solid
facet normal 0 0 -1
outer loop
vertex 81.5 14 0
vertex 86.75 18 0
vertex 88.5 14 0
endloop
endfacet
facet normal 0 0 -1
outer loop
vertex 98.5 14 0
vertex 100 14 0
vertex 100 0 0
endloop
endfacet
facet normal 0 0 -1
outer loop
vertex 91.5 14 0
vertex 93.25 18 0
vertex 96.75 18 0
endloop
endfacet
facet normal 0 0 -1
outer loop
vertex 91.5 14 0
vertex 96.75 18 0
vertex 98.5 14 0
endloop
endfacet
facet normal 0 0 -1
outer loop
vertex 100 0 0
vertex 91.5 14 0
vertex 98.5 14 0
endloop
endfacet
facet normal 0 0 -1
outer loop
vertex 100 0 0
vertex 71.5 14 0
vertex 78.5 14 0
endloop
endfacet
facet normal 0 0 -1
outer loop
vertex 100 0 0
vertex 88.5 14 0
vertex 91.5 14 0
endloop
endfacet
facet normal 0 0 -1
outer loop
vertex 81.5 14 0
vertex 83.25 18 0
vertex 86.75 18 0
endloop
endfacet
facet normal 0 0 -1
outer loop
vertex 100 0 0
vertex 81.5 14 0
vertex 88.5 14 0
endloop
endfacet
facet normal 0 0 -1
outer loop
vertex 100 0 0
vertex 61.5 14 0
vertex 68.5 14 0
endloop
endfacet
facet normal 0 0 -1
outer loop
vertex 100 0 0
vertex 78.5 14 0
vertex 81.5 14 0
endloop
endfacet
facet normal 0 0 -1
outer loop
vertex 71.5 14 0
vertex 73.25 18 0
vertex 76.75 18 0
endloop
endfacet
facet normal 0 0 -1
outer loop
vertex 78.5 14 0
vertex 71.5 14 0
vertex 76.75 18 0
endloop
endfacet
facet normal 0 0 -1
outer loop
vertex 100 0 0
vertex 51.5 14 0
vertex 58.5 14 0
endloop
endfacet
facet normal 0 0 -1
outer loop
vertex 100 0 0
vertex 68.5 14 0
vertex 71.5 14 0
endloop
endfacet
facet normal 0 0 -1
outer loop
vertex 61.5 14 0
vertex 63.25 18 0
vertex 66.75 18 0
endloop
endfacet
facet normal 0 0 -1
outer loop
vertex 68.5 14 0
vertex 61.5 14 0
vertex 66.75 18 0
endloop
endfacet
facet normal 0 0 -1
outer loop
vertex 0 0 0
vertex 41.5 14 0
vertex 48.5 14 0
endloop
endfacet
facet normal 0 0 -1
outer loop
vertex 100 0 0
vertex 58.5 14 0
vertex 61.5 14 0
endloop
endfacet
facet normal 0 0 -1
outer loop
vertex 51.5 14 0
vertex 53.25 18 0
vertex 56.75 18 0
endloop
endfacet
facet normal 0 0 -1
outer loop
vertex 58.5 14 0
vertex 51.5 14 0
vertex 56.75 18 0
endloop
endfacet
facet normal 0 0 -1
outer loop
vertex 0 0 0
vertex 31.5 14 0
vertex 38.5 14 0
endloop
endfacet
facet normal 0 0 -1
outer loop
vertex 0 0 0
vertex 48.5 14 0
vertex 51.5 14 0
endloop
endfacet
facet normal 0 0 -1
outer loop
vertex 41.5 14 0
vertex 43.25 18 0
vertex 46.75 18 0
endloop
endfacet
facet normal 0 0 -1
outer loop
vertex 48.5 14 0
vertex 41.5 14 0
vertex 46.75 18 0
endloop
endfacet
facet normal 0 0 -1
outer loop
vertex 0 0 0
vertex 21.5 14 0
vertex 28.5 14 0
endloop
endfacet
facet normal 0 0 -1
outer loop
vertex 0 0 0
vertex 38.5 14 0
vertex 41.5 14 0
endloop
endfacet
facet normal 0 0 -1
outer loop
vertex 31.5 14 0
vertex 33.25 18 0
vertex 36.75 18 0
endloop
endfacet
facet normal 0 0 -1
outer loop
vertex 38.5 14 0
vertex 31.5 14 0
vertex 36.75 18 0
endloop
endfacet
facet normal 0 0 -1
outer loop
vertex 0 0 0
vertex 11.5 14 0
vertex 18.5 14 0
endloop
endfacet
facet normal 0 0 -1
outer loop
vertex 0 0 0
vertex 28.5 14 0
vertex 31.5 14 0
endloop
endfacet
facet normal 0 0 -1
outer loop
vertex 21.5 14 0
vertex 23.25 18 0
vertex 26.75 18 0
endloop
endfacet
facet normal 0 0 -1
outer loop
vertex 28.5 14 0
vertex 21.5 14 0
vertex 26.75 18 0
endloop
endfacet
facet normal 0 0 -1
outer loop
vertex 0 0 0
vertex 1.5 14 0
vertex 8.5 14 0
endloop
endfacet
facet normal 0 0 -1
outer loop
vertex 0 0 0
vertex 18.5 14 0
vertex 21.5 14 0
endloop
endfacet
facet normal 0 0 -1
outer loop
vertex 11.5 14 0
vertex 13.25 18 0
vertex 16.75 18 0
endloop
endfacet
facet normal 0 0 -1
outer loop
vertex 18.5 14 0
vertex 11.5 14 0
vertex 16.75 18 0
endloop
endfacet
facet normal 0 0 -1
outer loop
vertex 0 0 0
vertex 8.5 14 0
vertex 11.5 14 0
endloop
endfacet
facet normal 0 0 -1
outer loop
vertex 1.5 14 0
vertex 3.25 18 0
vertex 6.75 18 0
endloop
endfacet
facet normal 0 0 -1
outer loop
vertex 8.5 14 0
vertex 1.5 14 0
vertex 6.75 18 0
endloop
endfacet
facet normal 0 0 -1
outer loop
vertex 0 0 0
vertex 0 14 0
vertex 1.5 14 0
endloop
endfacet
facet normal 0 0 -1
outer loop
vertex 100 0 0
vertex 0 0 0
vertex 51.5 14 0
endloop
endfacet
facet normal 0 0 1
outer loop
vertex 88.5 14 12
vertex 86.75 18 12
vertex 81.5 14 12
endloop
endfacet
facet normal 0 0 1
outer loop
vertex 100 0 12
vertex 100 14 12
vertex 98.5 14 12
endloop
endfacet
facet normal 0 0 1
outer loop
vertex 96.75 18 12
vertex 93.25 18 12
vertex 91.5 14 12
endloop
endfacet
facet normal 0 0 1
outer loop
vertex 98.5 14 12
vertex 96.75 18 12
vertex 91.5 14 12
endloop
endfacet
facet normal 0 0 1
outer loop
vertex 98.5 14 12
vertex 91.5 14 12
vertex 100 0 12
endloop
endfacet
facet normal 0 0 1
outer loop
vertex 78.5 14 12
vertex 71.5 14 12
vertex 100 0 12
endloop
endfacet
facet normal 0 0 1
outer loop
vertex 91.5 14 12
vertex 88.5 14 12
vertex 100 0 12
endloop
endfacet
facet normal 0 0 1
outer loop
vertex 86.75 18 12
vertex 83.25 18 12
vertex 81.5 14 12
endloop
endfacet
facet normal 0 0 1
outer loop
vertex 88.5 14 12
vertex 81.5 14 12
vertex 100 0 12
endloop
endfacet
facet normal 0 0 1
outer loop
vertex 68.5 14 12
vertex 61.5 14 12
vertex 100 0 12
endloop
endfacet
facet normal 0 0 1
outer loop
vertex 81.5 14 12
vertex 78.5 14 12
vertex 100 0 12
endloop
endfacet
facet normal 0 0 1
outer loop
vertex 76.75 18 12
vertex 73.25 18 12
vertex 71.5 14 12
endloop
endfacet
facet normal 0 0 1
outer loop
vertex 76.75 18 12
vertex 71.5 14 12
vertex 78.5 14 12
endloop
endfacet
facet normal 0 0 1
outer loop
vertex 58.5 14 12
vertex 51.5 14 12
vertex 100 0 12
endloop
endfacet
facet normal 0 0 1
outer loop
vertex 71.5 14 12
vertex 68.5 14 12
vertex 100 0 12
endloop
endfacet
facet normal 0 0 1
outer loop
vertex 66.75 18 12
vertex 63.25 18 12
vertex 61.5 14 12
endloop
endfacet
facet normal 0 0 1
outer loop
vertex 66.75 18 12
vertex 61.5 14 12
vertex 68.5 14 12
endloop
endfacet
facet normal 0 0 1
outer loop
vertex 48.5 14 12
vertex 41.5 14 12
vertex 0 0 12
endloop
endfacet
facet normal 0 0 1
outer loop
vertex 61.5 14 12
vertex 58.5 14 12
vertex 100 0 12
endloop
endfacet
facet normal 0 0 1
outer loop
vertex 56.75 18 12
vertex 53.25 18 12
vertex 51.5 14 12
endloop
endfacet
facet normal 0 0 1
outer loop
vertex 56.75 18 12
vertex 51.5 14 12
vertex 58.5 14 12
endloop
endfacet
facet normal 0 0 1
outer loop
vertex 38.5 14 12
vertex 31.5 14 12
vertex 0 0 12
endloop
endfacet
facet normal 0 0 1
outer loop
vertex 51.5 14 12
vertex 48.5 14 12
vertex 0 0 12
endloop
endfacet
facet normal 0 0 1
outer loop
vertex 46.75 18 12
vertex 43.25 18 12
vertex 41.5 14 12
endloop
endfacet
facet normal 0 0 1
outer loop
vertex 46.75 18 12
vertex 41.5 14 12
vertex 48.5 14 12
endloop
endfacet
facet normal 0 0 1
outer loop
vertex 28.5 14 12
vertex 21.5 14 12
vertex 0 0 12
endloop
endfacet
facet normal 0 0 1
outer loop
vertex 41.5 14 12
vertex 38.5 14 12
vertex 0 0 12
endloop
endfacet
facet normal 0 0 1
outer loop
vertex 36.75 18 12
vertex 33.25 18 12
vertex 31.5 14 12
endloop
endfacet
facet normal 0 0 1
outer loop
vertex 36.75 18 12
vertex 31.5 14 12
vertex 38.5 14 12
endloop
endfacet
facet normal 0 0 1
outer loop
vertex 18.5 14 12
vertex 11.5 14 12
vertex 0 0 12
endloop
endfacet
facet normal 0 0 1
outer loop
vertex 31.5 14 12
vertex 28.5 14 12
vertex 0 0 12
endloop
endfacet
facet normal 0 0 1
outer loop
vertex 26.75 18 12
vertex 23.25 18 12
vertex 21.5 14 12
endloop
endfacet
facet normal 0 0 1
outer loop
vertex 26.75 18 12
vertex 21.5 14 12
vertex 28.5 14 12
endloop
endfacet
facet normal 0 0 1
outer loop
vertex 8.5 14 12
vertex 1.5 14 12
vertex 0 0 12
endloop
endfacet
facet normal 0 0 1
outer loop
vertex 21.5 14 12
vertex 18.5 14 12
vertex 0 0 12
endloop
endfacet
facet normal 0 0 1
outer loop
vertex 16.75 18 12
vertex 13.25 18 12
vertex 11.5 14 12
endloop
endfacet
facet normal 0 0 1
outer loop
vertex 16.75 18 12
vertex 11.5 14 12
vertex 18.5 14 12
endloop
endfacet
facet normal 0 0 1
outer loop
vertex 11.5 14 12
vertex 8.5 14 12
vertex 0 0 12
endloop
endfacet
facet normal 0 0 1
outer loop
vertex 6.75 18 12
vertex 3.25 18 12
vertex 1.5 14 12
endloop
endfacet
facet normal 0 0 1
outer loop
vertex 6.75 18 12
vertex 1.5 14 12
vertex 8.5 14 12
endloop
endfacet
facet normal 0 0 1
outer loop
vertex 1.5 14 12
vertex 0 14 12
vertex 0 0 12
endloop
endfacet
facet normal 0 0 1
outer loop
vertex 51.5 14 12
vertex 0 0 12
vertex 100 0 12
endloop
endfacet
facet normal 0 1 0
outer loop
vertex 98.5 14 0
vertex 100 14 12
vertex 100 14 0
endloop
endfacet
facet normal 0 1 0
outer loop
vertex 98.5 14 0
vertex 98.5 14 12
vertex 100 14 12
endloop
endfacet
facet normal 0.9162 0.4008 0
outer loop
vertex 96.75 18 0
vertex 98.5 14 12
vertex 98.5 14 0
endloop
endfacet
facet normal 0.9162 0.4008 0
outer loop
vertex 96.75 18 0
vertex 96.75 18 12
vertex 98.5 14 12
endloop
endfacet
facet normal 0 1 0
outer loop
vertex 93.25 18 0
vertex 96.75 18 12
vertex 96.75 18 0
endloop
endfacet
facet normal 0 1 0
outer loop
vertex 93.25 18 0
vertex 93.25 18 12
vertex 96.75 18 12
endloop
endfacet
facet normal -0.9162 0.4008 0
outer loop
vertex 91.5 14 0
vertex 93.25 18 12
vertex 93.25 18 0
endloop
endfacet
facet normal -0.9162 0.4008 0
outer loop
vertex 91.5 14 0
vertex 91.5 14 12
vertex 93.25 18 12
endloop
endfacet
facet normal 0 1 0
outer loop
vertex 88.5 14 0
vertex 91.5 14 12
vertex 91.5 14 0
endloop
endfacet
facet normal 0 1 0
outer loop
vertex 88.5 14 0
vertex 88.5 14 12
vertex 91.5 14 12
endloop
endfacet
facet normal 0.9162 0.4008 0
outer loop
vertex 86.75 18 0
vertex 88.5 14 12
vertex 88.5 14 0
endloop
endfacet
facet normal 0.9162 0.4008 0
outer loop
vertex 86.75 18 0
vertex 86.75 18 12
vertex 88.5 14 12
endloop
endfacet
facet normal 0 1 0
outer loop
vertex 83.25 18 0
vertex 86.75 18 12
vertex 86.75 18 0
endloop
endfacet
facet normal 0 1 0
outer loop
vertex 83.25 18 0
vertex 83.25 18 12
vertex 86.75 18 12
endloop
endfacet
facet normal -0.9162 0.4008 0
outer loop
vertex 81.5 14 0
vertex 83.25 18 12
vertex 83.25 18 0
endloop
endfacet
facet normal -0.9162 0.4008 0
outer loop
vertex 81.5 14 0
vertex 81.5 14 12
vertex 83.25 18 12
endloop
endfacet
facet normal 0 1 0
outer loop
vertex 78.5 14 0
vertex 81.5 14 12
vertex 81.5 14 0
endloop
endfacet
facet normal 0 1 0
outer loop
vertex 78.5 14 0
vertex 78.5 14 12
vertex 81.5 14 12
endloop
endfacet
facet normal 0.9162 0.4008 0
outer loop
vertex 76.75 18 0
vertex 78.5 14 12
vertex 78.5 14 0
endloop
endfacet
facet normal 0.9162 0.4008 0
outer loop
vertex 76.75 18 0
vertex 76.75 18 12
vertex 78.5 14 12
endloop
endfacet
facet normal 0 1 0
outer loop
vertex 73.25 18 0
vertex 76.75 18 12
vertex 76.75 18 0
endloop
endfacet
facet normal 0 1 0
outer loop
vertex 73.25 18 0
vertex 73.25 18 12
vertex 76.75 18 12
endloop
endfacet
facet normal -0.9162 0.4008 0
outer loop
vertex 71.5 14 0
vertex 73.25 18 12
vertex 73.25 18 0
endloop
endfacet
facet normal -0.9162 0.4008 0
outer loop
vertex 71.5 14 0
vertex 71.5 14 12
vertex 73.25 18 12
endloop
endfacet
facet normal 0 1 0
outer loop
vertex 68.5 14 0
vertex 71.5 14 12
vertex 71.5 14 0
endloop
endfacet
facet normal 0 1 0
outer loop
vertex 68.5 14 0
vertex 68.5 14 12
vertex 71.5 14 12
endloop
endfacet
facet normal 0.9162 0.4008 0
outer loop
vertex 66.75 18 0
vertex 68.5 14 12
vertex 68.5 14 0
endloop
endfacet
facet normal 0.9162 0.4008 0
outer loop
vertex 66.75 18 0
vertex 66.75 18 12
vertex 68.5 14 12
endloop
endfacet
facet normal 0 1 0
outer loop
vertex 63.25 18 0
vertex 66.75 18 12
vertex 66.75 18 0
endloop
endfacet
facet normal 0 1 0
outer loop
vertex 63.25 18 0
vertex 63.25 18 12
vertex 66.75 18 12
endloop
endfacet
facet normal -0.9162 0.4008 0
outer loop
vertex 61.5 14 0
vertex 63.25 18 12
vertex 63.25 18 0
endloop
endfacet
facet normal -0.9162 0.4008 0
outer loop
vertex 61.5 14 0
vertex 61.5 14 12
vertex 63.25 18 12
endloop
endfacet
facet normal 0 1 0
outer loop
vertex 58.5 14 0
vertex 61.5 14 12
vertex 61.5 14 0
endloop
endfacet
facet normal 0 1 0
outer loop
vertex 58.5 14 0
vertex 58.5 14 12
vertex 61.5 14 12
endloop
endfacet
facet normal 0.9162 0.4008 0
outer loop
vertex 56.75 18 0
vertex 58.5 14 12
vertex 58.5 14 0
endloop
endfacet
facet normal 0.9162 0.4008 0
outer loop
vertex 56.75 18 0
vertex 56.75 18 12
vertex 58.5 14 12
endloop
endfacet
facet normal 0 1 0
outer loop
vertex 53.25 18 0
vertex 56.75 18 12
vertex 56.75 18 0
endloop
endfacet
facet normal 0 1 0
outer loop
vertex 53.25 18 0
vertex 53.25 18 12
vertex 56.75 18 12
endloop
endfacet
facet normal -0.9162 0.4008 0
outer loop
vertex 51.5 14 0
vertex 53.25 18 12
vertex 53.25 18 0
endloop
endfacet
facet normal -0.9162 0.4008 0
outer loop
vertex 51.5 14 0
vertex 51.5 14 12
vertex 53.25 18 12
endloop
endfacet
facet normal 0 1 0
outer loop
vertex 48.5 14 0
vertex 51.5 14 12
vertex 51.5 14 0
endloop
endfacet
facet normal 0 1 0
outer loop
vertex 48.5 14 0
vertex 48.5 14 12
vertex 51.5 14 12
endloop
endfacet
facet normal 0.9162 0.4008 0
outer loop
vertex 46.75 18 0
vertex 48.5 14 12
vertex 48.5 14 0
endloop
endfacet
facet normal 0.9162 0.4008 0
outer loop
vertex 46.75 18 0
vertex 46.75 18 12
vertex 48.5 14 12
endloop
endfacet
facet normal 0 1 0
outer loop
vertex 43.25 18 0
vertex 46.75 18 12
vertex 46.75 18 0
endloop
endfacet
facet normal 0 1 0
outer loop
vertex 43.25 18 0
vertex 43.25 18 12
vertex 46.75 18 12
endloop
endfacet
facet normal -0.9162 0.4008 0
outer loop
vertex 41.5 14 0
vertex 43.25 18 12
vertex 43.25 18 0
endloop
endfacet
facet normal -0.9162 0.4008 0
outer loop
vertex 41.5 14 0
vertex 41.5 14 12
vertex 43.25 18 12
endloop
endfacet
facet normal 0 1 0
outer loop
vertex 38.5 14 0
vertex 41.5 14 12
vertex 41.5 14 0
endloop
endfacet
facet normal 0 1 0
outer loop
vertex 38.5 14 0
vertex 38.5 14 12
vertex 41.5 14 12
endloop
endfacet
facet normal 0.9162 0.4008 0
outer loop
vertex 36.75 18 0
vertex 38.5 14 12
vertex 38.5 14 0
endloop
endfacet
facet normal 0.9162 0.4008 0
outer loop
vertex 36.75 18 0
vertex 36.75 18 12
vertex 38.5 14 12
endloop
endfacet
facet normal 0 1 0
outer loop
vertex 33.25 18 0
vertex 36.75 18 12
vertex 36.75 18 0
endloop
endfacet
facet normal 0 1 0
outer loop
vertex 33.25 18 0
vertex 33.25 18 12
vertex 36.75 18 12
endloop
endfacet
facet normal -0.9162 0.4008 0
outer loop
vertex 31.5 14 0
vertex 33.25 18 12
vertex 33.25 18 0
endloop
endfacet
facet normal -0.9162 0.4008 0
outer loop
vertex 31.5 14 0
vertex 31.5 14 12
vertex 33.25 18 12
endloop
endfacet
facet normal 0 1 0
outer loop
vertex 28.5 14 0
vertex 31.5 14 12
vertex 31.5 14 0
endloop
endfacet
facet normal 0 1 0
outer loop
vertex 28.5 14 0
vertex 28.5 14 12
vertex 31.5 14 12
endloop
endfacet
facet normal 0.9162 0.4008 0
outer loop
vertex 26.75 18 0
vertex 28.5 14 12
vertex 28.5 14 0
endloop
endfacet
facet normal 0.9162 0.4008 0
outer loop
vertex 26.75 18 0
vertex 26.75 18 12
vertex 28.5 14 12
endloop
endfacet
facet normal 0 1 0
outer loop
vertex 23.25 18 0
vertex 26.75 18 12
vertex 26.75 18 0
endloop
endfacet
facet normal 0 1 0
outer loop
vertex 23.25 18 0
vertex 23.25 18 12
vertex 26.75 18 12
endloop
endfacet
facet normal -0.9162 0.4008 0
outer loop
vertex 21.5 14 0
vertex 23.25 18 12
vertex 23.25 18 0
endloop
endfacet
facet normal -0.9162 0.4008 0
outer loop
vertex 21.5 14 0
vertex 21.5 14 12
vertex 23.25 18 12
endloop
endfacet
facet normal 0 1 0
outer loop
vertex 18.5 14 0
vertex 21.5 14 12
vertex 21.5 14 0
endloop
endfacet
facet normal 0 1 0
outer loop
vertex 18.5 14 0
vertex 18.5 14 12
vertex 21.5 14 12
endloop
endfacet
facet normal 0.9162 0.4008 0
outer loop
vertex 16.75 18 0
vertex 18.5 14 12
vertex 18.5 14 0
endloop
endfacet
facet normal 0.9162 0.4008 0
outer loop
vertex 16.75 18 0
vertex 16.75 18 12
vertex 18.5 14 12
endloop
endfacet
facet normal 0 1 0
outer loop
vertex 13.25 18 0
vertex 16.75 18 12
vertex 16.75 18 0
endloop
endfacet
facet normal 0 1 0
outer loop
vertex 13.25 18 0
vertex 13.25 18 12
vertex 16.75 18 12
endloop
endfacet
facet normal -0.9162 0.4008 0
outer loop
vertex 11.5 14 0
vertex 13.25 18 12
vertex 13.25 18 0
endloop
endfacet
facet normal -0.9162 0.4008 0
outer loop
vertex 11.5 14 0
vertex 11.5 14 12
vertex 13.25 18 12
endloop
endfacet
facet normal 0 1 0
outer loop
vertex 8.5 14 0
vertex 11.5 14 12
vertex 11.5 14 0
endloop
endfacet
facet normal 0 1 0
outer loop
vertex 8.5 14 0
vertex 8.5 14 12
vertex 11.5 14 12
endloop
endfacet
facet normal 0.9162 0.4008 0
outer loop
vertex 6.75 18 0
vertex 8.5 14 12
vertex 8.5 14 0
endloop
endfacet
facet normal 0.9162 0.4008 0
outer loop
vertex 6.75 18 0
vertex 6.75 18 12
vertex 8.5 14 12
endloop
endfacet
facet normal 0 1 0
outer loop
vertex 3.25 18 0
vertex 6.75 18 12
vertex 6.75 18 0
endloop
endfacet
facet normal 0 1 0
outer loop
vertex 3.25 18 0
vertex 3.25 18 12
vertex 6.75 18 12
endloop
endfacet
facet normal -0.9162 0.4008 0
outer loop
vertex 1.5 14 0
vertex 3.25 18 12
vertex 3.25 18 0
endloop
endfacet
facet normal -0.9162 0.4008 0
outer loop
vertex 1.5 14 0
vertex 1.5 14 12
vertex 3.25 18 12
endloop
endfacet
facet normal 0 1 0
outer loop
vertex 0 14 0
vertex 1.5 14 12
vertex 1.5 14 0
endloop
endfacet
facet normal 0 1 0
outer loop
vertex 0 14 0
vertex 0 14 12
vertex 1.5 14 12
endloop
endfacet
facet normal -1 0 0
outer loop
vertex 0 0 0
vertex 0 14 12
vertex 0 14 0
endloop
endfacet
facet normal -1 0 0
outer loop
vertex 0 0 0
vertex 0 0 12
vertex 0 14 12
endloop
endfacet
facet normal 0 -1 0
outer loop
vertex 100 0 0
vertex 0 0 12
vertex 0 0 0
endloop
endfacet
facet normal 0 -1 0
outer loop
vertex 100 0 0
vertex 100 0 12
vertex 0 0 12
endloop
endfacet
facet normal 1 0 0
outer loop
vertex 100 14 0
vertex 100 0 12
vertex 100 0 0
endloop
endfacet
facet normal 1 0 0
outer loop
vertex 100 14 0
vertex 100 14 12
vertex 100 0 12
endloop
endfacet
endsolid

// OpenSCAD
$fn = 32;

// ----------------------------------------------------------------------
// Gear rack: 10 teeth, pitch 10 mm
// ----------------------------------------------------------------------

// --- parameters (mm) ---
teeth = 10;               // number of teeth
pitch = 10;               // tooth pitch, X
root_w = 7;               // tooth width at the root
tip_w = 3.5;              // tooth width at the tip
base_h = 14;              // rack body height, Y
tooth_h = 4;              // tooth height above the body
plate_t = 12;             // rack width, Z (extrusion height)

rack_l = teeth * pitch;  // overall length
total_h = base_h + tooth_h;  // overall height

profile = [[0, 0], [100, 0], [100, 14], [98.5, 14], [96.75, 18], [93.25, 18], [91.5, 14], [88.5, 14], [86.75, 18], [83.25, 18], [81.5, 14], [78.5, 14], [76.75, 18], [73.25, 18], [71.5, 14], [68.5, 14], [66.75, 18], [63.25, 18], [61.5, 14], [58.5, 14], [56.75, 18], [53.25, 18], [51.5, 14], [48.5, 14], [46.75, 18], [43.25, 18], [41.5, 14], [38.5, 14], [36.75, 18], [33.25, 18], [31.5, 14], [28.5, 14], [26.75, 18], [23.25, 18], [21.5, 14], [18.5, 14], [16.75, 18], [13.25, 18], [11.5, 14], [8.5, 14], [6.75, 18], [3.25, 18], [1.5, 14], [0, 14]];  // primary outline, 44 points, counter clockwise

// --- the one profile operation ---
linear_extrude(height = plate_t) polygon(points = profile);
